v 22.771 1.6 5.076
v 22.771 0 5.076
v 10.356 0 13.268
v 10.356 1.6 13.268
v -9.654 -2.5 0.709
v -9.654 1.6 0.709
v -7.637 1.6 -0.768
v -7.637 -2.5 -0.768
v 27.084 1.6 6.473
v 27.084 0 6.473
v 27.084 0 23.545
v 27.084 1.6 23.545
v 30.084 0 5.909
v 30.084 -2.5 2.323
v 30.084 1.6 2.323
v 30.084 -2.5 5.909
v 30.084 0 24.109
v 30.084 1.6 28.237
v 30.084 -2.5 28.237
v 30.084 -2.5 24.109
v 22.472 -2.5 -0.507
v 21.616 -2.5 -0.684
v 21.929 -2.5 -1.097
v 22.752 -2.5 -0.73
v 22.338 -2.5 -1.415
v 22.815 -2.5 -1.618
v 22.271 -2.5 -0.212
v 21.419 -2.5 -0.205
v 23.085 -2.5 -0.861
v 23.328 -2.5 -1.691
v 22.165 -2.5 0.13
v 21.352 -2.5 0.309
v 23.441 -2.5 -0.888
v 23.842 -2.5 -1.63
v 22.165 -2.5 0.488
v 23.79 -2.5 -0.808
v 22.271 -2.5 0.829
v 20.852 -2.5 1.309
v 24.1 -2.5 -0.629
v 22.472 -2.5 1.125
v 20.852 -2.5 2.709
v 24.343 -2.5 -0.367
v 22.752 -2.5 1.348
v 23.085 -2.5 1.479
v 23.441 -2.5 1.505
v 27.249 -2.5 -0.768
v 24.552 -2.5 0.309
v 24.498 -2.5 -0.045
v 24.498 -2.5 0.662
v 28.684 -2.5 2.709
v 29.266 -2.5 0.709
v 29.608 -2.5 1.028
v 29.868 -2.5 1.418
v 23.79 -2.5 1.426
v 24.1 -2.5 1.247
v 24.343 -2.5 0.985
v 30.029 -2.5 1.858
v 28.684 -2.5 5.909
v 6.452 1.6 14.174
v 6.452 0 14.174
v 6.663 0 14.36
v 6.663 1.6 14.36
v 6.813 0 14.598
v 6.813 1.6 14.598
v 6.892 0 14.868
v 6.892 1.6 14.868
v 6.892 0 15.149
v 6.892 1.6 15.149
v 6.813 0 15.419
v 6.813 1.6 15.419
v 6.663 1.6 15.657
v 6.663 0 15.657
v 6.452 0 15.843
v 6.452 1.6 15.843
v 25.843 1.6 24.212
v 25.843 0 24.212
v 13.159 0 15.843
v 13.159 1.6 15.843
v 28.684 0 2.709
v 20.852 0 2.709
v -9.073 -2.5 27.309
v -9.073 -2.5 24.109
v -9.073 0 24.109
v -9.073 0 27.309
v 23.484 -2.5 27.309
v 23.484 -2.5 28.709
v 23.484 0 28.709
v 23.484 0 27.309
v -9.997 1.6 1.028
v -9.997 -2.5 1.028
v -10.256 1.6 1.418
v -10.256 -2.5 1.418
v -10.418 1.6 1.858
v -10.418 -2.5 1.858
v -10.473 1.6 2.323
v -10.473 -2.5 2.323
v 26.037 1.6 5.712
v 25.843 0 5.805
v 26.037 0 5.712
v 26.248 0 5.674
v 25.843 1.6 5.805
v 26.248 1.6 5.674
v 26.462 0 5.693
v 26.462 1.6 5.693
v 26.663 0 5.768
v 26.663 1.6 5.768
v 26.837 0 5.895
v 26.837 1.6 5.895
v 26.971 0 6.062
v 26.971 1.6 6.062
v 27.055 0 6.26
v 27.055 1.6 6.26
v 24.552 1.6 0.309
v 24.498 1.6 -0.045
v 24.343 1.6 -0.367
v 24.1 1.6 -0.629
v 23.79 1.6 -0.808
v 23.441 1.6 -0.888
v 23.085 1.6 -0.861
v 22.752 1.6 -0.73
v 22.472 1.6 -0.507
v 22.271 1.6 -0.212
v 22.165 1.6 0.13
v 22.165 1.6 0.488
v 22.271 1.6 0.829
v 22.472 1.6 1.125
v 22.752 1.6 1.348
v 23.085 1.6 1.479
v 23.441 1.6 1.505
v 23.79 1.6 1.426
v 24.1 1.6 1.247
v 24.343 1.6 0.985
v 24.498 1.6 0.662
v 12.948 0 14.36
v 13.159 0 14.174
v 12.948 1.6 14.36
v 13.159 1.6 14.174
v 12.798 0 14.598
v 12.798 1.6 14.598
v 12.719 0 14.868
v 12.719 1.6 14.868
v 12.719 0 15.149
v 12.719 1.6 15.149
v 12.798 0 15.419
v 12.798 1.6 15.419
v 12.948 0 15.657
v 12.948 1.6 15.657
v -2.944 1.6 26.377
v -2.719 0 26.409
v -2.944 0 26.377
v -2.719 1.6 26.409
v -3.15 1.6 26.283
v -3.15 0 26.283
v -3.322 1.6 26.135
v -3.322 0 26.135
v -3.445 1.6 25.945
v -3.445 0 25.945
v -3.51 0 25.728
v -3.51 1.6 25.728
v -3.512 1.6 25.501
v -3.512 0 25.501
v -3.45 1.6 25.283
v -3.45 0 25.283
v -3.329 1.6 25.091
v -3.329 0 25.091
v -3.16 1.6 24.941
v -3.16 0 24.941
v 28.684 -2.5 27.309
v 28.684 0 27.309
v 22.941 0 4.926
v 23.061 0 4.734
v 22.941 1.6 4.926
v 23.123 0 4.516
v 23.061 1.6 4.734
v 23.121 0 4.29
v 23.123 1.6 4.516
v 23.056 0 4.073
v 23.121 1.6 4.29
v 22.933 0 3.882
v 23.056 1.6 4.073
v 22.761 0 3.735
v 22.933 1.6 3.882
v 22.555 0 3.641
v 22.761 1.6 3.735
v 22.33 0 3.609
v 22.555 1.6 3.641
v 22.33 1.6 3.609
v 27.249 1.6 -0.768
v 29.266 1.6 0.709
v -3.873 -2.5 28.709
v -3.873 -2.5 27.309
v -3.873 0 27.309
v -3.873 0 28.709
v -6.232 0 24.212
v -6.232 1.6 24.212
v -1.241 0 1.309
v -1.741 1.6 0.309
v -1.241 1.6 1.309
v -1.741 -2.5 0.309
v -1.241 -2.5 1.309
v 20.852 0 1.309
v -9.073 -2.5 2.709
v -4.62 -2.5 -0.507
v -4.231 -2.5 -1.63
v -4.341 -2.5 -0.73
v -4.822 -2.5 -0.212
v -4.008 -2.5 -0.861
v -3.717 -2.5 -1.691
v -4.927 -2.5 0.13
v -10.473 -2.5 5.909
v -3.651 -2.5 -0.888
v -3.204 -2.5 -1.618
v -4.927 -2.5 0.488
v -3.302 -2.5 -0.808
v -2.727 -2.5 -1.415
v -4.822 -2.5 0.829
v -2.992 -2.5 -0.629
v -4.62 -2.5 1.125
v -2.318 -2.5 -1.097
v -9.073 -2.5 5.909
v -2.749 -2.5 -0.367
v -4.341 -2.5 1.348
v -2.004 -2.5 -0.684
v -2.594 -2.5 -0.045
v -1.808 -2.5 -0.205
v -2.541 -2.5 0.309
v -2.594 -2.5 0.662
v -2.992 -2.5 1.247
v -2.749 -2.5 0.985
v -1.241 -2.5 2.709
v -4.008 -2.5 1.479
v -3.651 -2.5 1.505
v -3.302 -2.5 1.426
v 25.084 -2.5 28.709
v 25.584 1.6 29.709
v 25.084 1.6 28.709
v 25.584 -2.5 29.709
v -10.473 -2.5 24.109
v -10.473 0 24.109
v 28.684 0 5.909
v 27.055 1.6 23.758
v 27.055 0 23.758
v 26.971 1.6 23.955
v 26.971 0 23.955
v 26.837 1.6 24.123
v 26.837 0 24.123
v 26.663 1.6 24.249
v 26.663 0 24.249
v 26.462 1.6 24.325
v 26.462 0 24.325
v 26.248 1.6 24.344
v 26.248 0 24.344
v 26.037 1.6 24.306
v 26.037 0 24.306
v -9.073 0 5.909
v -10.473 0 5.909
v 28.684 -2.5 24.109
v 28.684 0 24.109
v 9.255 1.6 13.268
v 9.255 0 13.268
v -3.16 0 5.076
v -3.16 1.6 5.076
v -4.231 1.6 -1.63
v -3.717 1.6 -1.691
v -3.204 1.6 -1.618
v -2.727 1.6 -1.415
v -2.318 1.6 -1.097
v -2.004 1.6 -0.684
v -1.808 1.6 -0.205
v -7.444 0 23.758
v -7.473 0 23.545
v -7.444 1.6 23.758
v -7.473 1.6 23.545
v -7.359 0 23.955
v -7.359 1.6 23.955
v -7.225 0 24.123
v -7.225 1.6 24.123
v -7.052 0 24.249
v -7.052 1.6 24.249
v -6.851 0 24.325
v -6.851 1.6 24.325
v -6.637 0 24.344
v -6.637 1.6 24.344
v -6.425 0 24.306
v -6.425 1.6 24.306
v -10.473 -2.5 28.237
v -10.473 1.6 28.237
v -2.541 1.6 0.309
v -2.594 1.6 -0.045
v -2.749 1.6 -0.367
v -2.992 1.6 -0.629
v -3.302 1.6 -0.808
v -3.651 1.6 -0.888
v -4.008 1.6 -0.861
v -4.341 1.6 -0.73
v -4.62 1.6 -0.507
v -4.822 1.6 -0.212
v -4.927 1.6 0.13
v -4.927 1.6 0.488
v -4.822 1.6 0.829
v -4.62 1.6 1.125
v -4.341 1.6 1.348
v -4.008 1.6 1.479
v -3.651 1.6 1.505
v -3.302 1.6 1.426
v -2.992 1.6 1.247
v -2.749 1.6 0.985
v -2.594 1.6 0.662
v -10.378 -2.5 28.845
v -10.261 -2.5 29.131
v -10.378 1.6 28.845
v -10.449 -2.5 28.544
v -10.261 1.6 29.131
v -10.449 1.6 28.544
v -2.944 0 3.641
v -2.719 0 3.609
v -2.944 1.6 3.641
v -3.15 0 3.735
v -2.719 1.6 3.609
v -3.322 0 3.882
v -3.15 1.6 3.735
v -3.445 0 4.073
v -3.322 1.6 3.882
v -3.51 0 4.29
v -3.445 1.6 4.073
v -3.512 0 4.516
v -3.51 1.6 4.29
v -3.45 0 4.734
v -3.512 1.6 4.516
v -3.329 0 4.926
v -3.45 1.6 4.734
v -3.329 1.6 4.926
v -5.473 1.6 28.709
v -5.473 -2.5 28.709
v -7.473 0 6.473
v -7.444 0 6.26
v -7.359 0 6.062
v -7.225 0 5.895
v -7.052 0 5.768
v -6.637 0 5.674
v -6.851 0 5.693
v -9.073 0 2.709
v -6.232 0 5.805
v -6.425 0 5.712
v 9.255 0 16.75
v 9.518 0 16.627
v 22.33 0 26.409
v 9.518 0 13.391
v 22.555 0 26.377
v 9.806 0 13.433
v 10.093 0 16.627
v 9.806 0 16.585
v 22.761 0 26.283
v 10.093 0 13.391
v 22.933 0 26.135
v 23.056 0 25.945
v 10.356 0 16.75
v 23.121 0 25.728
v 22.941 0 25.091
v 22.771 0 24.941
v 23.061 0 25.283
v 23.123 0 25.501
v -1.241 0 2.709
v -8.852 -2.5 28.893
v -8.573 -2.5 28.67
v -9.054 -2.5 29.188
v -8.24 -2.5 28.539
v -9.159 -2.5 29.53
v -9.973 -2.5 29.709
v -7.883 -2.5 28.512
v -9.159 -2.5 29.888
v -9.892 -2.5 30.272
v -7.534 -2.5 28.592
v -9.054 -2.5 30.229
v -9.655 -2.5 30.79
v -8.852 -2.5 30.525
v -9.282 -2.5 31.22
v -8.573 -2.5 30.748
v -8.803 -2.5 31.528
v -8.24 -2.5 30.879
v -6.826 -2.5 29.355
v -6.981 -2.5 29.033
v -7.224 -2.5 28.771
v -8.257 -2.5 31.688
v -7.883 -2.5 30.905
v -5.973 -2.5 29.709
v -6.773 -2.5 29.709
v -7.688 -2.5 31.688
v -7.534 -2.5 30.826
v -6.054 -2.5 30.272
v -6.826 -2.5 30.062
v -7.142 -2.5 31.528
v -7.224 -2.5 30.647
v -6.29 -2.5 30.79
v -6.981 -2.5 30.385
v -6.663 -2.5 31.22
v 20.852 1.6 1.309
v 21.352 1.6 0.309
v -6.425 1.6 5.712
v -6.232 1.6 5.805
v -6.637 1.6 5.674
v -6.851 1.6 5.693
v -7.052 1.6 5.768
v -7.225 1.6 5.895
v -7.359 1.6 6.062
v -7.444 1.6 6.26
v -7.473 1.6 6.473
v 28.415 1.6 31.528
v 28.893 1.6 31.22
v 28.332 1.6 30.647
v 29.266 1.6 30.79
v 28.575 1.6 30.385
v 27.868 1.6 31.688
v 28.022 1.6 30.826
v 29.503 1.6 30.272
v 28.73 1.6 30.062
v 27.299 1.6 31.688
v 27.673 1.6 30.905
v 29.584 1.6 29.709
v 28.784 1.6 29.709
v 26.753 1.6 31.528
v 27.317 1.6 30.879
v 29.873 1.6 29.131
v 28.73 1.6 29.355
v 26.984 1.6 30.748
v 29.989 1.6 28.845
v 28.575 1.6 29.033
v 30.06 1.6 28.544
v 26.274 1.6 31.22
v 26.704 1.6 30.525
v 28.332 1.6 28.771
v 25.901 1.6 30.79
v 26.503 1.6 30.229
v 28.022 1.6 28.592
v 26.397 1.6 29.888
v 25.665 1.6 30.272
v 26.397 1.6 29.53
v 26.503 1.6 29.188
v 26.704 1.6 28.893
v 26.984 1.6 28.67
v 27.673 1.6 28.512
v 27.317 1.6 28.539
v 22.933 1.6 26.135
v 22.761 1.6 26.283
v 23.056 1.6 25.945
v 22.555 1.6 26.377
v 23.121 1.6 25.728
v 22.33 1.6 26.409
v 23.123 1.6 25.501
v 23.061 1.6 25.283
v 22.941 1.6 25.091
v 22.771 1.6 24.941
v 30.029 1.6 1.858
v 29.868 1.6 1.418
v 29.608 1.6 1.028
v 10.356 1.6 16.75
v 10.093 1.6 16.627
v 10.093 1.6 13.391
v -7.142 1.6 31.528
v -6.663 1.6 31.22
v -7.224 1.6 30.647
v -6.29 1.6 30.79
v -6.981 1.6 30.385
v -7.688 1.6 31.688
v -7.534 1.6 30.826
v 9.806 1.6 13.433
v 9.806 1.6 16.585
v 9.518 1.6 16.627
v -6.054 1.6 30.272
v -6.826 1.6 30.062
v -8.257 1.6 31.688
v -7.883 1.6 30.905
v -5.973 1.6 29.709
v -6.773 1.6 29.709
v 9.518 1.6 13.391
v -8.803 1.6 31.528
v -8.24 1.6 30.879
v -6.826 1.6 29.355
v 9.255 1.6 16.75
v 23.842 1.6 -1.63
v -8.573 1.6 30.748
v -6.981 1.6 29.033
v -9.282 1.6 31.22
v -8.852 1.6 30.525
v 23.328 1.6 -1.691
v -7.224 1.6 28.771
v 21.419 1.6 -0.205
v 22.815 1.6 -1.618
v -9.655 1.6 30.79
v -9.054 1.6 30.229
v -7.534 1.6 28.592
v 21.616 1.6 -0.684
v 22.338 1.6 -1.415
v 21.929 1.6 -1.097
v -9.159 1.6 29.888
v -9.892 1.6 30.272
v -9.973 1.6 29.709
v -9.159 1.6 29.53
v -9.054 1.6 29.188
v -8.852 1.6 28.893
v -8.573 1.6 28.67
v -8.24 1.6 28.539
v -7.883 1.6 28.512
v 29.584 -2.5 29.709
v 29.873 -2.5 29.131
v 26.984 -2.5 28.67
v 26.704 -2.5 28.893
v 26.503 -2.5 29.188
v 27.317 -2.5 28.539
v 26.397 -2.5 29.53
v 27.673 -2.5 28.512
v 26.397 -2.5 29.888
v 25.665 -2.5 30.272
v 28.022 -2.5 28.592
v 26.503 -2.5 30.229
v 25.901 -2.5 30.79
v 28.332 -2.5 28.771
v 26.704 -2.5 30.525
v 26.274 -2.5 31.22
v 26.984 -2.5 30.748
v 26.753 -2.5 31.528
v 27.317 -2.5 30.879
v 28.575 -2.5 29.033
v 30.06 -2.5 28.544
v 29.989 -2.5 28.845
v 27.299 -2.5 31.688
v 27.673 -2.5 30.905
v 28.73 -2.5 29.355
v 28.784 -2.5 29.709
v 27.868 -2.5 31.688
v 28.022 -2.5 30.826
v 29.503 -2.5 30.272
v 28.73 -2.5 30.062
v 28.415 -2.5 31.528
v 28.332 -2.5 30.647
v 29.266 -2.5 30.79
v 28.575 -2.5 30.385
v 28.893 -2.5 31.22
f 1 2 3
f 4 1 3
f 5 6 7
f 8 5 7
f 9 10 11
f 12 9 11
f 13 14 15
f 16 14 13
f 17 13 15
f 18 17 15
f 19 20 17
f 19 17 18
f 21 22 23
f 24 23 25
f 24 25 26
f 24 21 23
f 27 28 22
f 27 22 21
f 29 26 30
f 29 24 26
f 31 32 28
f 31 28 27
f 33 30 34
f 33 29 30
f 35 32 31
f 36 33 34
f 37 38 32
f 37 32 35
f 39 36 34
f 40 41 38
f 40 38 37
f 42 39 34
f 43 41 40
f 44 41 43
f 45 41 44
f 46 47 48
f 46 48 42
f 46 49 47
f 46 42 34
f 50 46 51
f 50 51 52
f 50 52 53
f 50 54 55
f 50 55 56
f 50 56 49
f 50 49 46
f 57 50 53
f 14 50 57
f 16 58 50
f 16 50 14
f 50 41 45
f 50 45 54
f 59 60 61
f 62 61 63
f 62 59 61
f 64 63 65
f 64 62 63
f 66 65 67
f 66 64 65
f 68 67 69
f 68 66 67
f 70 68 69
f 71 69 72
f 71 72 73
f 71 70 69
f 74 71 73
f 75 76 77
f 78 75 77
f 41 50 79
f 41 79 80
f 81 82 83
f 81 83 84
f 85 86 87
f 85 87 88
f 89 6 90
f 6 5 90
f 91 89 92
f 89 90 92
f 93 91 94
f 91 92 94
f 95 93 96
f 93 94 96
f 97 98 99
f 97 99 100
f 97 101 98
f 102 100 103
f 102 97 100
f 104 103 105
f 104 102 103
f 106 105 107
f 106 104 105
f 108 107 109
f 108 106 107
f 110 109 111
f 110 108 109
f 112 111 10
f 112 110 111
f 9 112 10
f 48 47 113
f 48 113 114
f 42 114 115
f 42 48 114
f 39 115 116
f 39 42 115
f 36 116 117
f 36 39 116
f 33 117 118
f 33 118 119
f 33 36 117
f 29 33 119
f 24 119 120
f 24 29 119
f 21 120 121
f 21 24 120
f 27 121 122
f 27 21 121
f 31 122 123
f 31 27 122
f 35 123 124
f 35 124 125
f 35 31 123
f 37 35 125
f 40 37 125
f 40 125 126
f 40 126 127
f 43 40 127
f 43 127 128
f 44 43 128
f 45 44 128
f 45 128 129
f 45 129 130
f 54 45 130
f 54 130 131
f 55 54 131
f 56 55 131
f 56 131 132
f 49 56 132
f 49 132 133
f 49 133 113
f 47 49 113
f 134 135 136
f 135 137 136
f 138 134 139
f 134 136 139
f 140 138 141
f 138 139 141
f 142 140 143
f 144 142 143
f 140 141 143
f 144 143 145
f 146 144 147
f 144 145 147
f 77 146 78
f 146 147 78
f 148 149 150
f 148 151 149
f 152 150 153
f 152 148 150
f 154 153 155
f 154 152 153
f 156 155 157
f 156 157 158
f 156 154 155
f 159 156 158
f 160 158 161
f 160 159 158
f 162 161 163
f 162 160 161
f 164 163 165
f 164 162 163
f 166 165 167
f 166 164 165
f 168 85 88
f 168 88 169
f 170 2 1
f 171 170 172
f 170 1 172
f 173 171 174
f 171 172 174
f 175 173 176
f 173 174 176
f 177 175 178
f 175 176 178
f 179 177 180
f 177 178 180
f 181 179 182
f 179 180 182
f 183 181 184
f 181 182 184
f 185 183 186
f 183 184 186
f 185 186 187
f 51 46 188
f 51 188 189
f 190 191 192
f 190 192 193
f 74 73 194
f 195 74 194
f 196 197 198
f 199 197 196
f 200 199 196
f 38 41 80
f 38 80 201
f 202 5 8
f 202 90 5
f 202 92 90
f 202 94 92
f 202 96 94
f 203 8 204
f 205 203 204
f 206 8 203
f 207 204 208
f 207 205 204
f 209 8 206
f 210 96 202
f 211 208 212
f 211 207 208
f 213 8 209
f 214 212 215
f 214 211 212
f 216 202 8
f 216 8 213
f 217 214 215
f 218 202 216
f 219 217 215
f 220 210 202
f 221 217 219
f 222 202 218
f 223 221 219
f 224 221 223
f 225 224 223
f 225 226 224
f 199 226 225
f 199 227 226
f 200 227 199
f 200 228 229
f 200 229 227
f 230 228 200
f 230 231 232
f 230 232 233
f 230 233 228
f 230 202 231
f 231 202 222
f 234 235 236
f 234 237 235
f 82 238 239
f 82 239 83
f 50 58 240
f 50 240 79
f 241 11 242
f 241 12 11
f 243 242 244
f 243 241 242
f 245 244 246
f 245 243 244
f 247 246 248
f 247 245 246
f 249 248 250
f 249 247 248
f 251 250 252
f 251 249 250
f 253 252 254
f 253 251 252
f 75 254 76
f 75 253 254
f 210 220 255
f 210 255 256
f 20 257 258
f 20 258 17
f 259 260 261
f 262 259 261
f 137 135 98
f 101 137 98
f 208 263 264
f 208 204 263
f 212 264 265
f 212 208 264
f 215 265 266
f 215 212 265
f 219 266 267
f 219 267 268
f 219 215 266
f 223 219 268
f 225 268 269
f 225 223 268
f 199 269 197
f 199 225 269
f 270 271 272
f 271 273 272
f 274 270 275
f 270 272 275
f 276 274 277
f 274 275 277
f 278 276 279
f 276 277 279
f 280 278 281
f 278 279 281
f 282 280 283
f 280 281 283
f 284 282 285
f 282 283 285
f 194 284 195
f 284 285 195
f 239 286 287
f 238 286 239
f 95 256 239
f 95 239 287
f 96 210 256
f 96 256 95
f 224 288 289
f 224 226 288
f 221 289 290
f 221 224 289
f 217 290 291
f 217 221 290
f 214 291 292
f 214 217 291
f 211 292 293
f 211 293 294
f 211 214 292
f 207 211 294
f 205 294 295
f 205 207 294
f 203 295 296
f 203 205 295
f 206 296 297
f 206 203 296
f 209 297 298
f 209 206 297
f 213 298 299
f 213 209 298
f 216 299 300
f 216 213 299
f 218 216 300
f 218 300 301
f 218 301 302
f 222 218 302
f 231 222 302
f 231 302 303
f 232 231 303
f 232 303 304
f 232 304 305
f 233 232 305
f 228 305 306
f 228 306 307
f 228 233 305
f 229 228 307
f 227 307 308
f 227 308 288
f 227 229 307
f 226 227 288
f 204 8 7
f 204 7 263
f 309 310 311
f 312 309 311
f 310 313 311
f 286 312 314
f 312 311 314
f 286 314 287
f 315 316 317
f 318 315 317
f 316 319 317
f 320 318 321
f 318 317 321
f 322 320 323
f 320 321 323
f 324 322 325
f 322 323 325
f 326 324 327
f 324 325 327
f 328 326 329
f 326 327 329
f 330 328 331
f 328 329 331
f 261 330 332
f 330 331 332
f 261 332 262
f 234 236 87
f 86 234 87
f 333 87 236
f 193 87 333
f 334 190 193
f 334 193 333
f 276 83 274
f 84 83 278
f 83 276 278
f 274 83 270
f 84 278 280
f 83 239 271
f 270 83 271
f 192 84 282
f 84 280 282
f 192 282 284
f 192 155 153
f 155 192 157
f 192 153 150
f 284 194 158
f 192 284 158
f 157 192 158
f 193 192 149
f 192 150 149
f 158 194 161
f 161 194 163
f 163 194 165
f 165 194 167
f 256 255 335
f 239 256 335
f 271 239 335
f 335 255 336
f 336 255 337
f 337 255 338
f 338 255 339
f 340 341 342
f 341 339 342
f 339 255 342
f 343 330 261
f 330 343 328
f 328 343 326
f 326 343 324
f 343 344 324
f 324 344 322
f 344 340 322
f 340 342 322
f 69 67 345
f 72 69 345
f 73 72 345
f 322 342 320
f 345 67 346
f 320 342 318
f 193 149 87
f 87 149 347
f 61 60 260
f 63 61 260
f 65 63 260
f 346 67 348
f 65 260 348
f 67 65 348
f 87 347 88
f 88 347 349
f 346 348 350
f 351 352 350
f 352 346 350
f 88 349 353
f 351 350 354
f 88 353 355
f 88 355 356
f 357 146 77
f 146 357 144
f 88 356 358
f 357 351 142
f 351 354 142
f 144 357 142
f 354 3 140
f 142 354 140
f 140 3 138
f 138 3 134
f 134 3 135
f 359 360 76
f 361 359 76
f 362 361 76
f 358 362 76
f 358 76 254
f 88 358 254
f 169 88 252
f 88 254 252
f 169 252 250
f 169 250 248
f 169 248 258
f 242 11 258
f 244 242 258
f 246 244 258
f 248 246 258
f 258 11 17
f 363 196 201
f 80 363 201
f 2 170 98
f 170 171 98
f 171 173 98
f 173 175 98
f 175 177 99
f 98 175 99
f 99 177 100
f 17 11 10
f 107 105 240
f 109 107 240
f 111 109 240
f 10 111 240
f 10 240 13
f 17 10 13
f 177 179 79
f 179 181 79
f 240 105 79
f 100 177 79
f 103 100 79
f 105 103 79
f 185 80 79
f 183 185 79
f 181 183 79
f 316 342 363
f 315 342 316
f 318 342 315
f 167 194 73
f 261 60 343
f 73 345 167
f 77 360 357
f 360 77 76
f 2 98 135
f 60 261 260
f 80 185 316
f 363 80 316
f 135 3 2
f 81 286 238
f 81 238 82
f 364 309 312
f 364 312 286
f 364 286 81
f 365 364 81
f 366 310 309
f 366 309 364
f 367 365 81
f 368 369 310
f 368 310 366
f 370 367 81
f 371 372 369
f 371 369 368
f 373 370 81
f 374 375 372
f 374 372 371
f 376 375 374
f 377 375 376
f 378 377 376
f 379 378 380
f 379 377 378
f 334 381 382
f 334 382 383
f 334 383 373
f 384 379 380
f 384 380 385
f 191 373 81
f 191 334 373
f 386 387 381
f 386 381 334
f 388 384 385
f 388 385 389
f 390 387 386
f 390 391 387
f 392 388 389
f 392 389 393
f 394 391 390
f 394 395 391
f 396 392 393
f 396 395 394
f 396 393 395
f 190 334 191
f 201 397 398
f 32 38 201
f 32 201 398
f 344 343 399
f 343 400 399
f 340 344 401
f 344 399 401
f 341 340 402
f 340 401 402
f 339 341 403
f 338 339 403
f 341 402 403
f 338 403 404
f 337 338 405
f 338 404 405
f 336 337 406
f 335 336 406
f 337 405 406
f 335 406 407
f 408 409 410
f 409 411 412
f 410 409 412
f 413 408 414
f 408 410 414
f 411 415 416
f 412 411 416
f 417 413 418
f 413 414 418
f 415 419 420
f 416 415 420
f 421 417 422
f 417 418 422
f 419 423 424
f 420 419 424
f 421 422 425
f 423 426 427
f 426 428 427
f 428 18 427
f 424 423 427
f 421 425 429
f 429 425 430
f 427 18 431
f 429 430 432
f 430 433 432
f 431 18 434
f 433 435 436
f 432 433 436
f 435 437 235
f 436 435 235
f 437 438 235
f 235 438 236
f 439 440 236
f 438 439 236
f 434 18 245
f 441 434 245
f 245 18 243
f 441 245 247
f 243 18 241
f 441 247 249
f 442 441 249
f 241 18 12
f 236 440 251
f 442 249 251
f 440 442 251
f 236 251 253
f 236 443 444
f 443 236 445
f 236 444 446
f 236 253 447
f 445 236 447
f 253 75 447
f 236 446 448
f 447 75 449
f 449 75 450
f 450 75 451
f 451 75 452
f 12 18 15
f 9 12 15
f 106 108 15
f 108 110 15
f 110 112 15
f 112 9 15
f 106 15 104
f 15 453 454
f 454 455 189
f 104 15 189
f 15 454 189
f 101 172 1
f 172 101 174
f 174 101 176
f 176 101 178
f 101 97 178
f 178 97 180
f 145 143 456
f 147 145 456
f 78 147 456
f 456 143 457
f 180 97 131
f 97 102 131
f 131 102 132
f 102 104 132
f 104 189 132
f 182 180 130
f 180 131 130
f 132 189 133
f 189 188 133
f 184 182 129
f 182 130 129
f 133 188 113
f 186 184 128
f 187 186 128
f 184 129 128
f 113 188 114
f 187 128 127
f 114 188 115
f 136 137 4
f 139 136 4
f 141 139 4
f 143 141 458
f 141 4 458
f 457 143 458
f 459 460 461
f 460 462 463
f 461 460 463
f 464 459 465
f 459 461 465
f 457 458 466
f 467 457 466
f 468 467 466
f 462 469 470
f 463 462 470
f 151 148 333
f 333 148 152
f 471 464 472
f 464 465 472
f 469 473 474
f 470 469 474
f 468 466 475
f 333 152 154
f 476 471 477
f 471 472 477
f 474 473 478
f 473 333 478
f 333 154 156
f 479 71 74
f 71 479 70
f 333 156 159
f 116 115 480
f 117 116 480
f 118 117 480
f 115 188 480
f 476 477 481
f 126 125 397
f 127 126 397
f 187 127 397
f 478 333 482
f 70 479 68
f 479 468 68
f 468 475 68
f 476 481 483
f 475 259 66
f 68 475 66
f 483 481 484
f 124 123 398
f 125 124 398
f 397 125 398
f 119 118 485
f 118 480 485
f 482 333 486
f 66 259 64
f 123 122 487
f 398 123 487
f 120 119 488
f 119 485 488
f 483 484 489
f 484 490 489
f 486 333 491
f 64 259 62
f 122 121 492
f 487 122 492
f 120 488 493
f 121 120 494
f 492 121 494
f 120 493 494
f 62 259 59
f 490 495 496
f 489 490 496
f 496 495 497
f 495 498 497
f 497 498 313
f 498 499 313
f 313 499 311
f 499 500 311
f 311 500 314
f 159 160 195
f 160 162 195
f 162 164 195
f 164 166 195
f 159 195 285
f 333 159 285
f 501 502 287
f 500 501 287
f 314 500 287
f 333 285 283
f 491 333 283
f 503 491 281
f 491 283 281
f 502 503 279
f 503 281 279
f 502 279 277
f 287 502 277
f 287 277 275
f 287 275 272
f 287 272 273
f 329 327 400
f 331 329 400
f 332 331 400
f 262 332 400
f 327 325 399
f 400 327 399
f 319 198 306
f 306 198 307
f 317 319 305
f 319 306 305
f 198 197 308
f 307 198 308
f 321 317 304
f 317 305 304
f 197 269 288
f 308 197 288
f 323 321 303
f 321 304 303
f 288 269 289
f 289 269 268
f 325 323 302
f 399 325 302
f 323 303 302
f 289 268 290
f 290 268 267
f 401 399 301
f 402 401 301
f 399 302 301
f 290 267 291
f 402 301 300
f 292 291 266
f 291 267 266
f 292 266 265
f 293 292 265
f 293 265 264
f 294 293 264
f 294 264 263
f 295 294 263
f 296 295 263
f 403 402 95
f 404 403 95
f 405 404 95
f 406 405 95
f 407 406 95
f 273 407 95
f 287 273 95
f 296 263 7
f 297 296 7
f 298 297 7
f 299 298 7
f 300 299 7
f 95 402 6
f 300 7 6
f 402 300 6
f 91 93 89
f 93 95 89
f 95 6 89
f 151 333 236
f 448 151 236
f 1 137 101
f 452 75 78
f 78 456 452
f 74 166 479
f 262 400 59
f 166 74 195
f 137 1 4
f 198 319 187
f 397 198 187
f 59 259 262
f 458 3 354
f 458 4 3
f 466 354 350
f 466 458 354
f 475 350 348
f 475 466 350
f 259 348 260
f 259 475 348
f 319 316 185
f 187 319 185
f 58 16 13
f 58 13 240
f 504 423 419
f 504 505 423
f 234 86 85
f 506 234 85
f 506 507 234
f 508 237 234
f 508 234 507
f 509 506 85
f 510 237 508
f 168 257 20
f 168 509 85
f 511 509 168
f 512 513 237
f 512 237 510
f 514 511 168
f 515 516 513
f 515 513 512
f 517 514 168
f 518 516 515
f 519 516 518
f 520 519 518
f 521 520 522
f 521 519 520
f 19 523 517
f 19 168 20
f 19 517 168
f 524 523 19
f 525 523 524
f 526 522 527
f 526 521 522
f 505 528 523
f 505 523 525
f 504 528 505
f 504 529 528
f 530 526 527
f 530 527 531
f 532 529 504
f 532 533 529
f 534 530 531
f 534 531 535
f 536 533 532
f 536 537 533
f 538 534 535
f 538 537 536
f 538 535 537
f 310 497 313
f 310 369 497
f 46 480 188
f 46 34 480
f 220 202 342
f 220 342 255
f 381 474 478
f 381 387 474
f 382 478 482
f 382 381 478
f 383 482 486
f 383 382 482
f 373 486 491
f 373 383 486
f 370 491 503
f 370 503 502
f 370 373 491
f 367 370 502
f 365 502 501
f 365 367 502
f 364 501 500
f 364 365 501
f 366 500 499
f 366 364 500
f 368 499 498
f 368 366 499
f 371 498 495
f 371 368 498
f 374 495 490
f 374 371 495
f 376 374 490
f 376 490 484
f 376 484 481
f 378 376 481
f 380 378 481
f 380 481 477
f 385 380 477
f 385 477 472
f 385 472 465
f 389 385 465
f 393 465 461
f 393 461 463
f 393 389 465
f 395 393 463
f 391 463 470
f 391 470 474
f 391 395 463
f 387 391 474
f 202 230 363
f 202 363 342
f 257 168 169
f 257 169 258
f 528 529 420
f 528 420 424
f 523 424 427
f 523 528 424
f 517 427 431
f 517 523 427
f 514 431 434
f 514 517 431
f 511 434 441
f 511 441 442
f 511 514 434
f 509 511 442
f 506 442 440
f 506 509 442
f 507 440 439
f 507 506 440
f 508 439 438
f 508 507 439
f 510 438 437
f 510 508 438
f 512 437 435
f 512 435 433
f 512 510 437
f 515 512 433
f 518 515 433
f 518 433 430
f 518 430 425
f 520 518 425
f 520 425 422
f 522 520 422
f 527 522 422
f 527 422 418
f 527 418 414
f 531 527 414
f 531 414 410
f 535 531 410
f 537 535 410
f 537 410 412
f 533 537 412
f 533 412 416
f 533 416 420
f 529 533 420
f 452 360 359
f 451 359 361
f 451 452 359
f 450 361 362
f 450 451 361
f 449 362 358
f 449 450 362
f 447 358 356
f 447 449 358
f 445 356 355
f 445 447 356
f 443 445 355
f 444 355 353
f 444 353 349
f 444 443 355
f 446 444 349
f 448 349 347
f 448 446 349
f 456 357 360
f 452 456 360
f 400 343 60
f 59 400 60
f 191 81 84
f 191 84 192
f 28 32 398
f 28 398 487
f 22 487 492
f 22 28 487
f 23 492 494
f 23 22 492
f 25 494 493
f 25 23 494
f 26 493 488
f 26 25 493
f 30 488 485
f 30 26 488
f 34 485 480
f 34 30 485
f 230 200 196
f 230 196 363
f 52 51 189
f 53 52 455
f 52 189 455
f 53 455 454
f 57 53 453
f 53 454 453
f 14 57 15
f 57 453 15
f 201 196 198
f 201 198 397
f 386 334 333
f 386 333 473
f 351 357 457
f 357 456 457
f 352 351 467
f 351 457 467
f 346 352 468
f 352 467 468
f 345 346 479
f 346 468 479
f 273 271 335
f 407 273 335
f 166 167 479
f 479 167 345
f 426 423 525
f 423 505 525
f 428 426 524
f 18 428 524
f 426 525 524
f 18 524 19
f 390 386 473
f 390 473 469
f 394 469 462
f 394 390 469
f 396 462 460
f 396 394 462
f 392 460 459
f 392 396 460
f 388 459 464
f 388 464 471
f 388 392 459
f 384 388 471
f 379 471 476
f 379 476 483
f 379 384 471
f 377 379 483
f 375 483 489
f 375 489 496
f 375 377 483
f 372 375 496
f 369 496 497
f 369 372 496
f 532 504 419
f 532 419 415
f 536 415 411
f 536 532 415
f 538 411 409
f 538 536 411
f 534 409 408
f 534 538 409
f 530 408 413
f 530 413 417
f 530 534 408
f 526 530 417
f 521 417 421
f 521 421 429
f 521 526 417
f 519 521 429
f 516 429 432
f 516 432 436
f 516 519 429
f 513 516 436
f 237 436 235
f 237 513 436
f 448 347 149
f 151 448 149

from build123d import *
from build123d.topology import SkipClean

# Parameters (mm, degrees)
SKETCH1_R                = 1.38
SKETCH1_R_2              = 1
SKETCH1_W                = 37.356294072
SKETCH1_H                = 24.2
BOSS_EXTRUDE2_DEPTH      = 1.6
BOSS_EXTRUDE3_START      = 2.5
SKETCH3_R                = 1
BOSS_EXTRUDE3_DEPTH      = 2.5
SKETCH3_5_R              = 1.38
CUT_EXTRUDE1_DEPTH       = 3
MOVE_START               = -2.5
MOVE_FACE2_OUTLINE_R     = 1.2
MOVE_FACE2_OUTLINE_R_2   = 1
MOVE_FACE2_DEPTH         = 2.5
MOVE_FACE2_2_OUTLINE_R   = 1.2
MOVE_FACE2_2_OUTLINE_R_2 = 1
MOVE_FACE2_2_DEPTH       = 1.6
FILLET4_R                = 2
CUT_EXTRUDE2_DEPTH       = 10
FILLET6_R                = 1
FILLET7_R                = 0.8


# Read off the part's stored shape, not the designer's step: Move Face2
with BuildPart() as part:
    # Sketch1 → Boss-Extrude2 (new body)
    # profile 1 of 2: a face of its own
    with BuildSketch(Plane(origin=(0, 0, 0), x_dir=(1, 0, 0), z_dir=(0, 1, 0))):
        with BuildLine():
            ThreePointArc((29.583728431, -29.708730606), (27.583728431, -31.708730606), (25.583728431, -29.708730606))
            Line((25.583728431, -29.708730606), (25.083728431, -28.708730606))
            Line((25.083728431, -28.708730606), (9.805581395, -28.708730606))
            Line((9.805581395, -28.708730606), (-5.472565641, -28.708730606))
            Line((-5.472565641, -28.708730606), (-5.972565641, -29.708730606))
            ThreePointArc((-5.972565641, -29.708730606), (-7.972565641, -31.708730606), (-9.972565641, -29.708730606))
            Line((-9.972565641, -29.708730606), (-10.472565641, -28.708730606))
            Line((-10.472565641, -28.708730606), (-10.472565641, -6.308730606))
            Line((-10.472565641, -6.308730606), (-14.622565641, 1.591269394))
            ThreePointArc((-14.622565641, 1.591269394), (-16.743885984, 6.712589737), (-11.622565641, 4.591269394))
            Line((-11.622565641, 4.591269394), (-7.637430915, 0.768132014))
            Line((-7.637430915, 0.768132014), (-4.231183814, 1.630146375))
            ThreePointArc((-4.231183814, 1.630146375), (-2.511966494, 1.269454739), (-1.740514831, -0.308730606))
            Line((-1.740514831, -0.308730606), (-1.240514831, -1.308730606))
            Line((-1.240514831, -1.308730606), (20.851677621, -1.308730606))
            Line((20.851677621, -1.308730606), (21.351677621, -0.308730606))
            ThreePointArc((21.351677621, -0.308730606), (22.123129284, 1.269454739), (23.842346605, 1.630146375))
            Line((23.842346605, 1.630146375), (27.248593706, 0.768132014))
            Line((27.248593706, 0.768132014), (31.233728431, 4.591269394))
            ThreePointArc((31.233728431, 4.591269394), (36.355048775, 6.712589737), (34.233728431, 1.591269394))
            Line((34.233728431, 1.591269394), (30.083728431, -6.308730606))
            Line((30.083728431, -6.308730606), (30.083728431, -28.708730606))
            Line((30.083728431, -28.708730606), (29.583728431, -29.708730606))
        make_face()
        with Locations(Location((34.233728431, 4.591269394, 0), (0, 0, 270))):
            Circle(SKETCH1_R, mode=Mode.SUBTRACT)
        with Locations(Location((23.351677621, -0.308730606, 0), (0, 0, 270))):
            Circle(SKETCH1_R_2, mode=Mode.SUBTRACT)
        with Locations(Location((-3.740514831, -0.308730606, 0), (0, 0, 270))):
            Circle(SKETCH1_R_2, mode=Mode.SUBTRACT)
        with Locations(Location((-7.972565641, -29.708730606, 0), (0, 0, 270))):
            Circle(SKETCH1_R_2, mode=Mode.SUBTRACT)
        with Locations(Location((-14.622565641, 4.591269394, 0), (0, 0, 270))):
            Circle(SKETCH1_R, mode=Mode.SUBTRACT)
        with Locations(Location((27.583728431, -29.708730606, 0), (0, 0, 270))):
            Circle(SKETCH1_R_2, mode=Mode.SUBTRACT)
        with Locations((9.805581395, -15.008730606)):
            Rectangle(SKETCH1_W, SKETCH1_H, mode=Mode.SUBTRACT)
    # profile 2 of 2: a face of its own
    with BuildSketch(Plane(origin=(0, 0, 0), x_dir=(1, 0, 0), z_dir=(0, 1, 0))):
        with Locations((9.805581395, -15.008730606)):
            Rectangle(SKETCH1_W, SKETCH1_H)
    extrude(amount=BOSS_EXTRUDE2_DEPTH)

    # Sketch3 → Boss-Extrude3 (add)
    # profile 1 of 4: a face of its own
    with SkipClean():  # the faces are left unmerged after this step: merging them gives an invalid solid
        with BuildSketch(Plane.XZ.offset(BOSS_EXTRUDE3_START)):
            with BuildLine():
                Line((23.483728431, 27.108730606), (28.483728431, 27.108730606))
                Line((28.483728431, 27.108730606), (28.483728431, 24.108730606))
                Line((28.483728431, 24.108730606), (30.083728431, 24.108730606))
                Line((30.083728431, 24.108730606), (30.083728431, 28.708730606))
                Line((30.083728431, 28.708730606), (29.583728431, 29.708730606))
                ThreePointArc((29.583728431, 29.708730606), (27.583728431, 31.708730606), (25.583728431, 29.708730606))
                Line((25.583728431, 29.708730606), (25.083728431, 28.708730606))
                Line((25.083728431, 28.708730606), (23.483728431, 28.708730606))
                Line((23.483728431, 28.708730606), (23.483728431, 27.108730606))
            make_face()
            with Locations(Location((27.583728431, 29.708730606, 0), (0, 0, 270))):
                Circle(SKETCH3_R, mode=Mode.SUBTRACT)
        # profile 2 of 4: a face of its own
        with BuildSketch(Plane.XZ.offset(BOSS_EXTRUDE3_START)):
            with BuildLine():
                Line((-8.872565641, 27.108730606), (-3.872565641, 27.108730606))
                Line((-3.872565641, 27.108730606), (-3.872565641, 28.708730606))
                Line((-3.872565641, 28.708730606), (-5.472565641, 28.708730606))
                Line((-5.472565641, 28.708730606), (-5.972565641, 29.708730606))
                ThreePointArc((-5.972565641, 29.708730606), (-7.972565641, 31.708730606), (-9.972565641, 29.708730606))
                Line((-9.972565641, 29.708730606), (-10.472565641, 28.708730606))
                Line((-10.472565641, 28.708730606), (-10.472565641, 24.108730606))
                Line((-10.472565641, 24.108730606), (-8.872565641, 24.108730606))
                Line((-8.872565641, 24.108730606), (-8.872565641, 27.108730606))
            make_face()
            with Locations(Location((-7.972565641, 29.708730606, 0), (0, 0, 270))):
                Circle(SKETCH3_R, mode=Mode.SUBTRACT)
        # profile 3 of 4: a face of its own
        with BuildSketch(Plane.XZ.offset(BOSS_EXTRUDE3_START)):
            with BuildLine():
                Line((30.083728431, 5.908730606), (28.483728431, 5.908730606))
                Line((28.483728431, 5.908730606), (28.483728431, 2.908730606))
                Line((28.483728431, 2.908730606), (20.851677621, 2.908730606))
                Line((20.851677621, 2.908730606), (20.851677621, 1.308730606))
                Line((20.851677621, 1.308730606), (21.351677621, 0.308730606))
                ThreePointArc((21.351677621, 0.308730606), (22.123129284, -1.269454739), (23.842346605, -1.630146375))
                Line((23.842346605, -1.630146375), (27.248593706, -0.768132014))
                Line((27.248593706, -0.768132014), (30.083728431, 1.308730606))
                Line((30.083728431, 1.308730606), (30.083728431, 5.908730606))
            make_face()
            with Locations(Location((23.351677621, 0.308730606, 0), (0, 0, 270))):
                Circle(SKETCH3_R, mode=Mode.SUBTRACT)
        # profile 4 of 4: a face of its own
        with BuildSketch(Plane.XZ.offset(BOSS_EXTRUDE3_START)):
            with BuildLine():
                Line((-8.872565641, 2.908730606), (-8.872565641, 5.908730606))
                Line((-8.872565641, 5.908730606), (-10.472565641, 5.908730606))
                Line((-10.472565641, 5.908730606), (-10.472565641, 1.308730606))
                Line((-10.472565641, 1.308730606), (-7.637430915, -0.768132014))
                Line((-7.637430915, -0.768132014), (-4.231183814, -1.630146375))
                ThreePointArc((-4.231183814, -1.630146375), (-2.511966494, -1.269454739), (-1.740514831, 0.308730606))
                Line((-1.740514831, 0.308730606), (-1.240514831, 1.308730606))
                Line((-1.240514831, 1.308730606), (-1.240514831, 2.908730606))
                Line((-1.240514831, 2.908730606), (-8.872565641, 2.908730606))
            make_face()
            with Locations(Location((-3.740514831, 0.308730606, 0), (0, 0, 270))):
                Circle(SKETCH3_R, mode=Mode.SUBTRACT)
        extrude(amount=-BOSS_EXTRUDE3_DEPTH)

    # Sketch3<5> → Cut-Extrude1 (cut)
    # profile 1 of 2: a face of its own
    with SkipClean():  # the faces are left unmerged after this step: merging them gives an invalid solid
        with BuildSketch(Plane.XZ):
            with BuildLine():
                Line((27.248593706, -0.768132014), (30.083728431, 1.308730606))
                Line((30.083728431, 1.308730606), (30.083728431, 6.308730606))
                Line((30.083728431, 6.308730606), (34.233728431, -1.591269394))
                ThreePointArc((34.233728431, -1.591269394), (36.355048775, -6.712589737), (31.233728431, -4.591269394))
                Line((31.233728431, -4.591269394), (27.248593706, -0.768132014))
            make_face()
            with Locations((34.233728431, -4.591269394)):
                Circle(SKETCH3_5_R, mode=Mode.SUBTRACT)
        # profile 2 of 2: a face of its own
        with BuildSketch(Plane.XZ):
            with BuildLine():
                Line((-10.472565641, 1.308730606), (-7.637430915, -0.768132014))
                Line((-7.637430915, -0.768132014), (-11.622565641, -4.591269394))
                ThreePointArc((-11.622565641, -4.591269394), (-16.743885984, -6.712589737), (-14.622565641, -1.591269394))
                Line((-14.622565641, -1.591269394), (-10.472565641, 6.308730606))
                Line((-10.472565641, 6.308730606), (-10.472565641, 1.308730606))
            make_face()
            with Locations((-14.622565641, -4.591269394)):
                Circle(SKETCH3_5_R, mode=Mode.SUBTRACT)
        extrude(amount=-CUT_EXTRUDE1_DEPTH, mode=Mode.SUBTRACT)

    # Move Face2 outline → Move Face2 (cut)
    # profile 1 of 8: a face of its own
    with BuildSketch(Plane(origin=(0, 0, 0), x_dir=(1, 0, 0), z_dir=(0, 1, 0)).offset(MOVE_START)):
        with Locations((-7.972565641, -29.708730606)):
            Circle(MOVE_FACE2_OUTLINE_R)
        with Locations((-7.972565641, -29.708730606)):
            Circle(MOVE_FACE2_OUTLINE_R_2, mode=Mode.SUBTRACT)
    # profile 2 of 8: a face of its own
    with BuildSketch(Plane(origin=(0, 0, 0), x_dir=(1, 0, 0), z_dir=(0, 1, 0)).offset(MOVE_START)):
        with Locations((-3.740514831, -0.308730606)):
            Circle(MOVE_FACE2_OUTLINE_R)
        with Locations((-3.740514831, -0.308730606)):
            Circle(MOVE_FACE2_OUTLINE_R_2, mode=Mode.SUBTRACT)
    # profile 3 of 8: a face of its own
    with BuildSketch(Plane(origin=(0, 0, 0), x_dir=(1, 0, 0), z_dir=(0, 1, 0)).offset(MOVE_START)):
        with Locations((23.351677621, -0.308730606)):
            Circle(MOVE_FACE2_OUTLINE_R)
        with Locations((23.351677621, -0.308730606)):
            Circle(MOVE_FACE2_OUTLINE_R_2, mode=Mode.SUBTRACT)
    # profile 4 of 8: a face of its own
    with BuildSketch(Plane(origin=(0, 0, 0), x_dir=(1, 0, 0), z_dir=(0, 1, 0)).offset(MOVE_START)):
        with Locations((27.583728431, -29.708730606)):
            Circle(MOVE_FACE2_OUTLINE_R)
        with Locations((27.583728431, -29.708730606)):
            Circle(MOVE_FACE2_OUTLINE_R_2, mode=Mode.SUBTRACT)
    # profile 5 of 8: a face of its own
    with BuildSketch(Plane(origin=(0, 0, 0), x_dir=(1, 0, 0), z_dir=(0, 1, 0)).offset(MOVE_START)):
        Polygon((23.483728431, -27.308730606), (28.683728431, -27.308730606), (28.683728431, -24.108730606), (28.483728431, -24.108730606), (28.483728431, -27.108730606), (23.483728431, -27.108730606), align=None)
    # profile 6 of 8: a face of its own
    with BuildSketch(Plane(origin=(0, 0, 0), x_dir=(1, 0, 0), z_dir=(0, 1, 0)).offset(MOVE_START)):
        Polygon((-9.072565641, -27.308730606), (-3.872565641, -27.308730606), (-3.872565641, -27.108730606), (-8.872565641, -27.108730606), (-8.872565641, -24.108730606), (-9.072565641, -24.108730606), align=None)
    # profile 7 of 8: a face of its own
    with BuildSketch(Plane(origin=(0, 0, 0), x_dir=(1, 0, 0), z_dir=(0, 1, 0)).offset(MOVE_START)):
        Polygon((28.683728431, -5.908730606), (28.683728431, -2.708730606), (20.851677621, -2.708730606), (20.851677621, -2.908730606), (28.483728431, -2.908730606), (28.483728431, -5.908730606), align=None)
    # profile 8 of 8: a face of its own
    with BuildSketch(Plane(origin=(0, 0, 0), x_dir=(1, 0, 0), z_dir=(0, 1, 0)).offset(MOVE_START)):
        Polygon((-9.072565641, -2.708730606), (-9.072565641, -5.908730606), (-8.872565641, -5.908730606), (-8.872565641, -2.908730606), (-1.240514831, -2.908730606), (-1.240514831, -2.708730606), align=None)
    extrude(amount=MOVE_FACE2_DEPTH, mode=Mode.SUBTRACT)

    # Move Face2 2 outline → Move Face2 2 (cut)
    # profile 1 of 4: a face of its own
    with BuildSketch(Plane(origin=(0, 0, 0), x_dir=(1, 0, 0), z_dir=(0, 1, 0))):
        with Locations((-7.972565641, -29.708730606)):
            Circle(MOVE_FACE2_2_OUTLINE_R)
        with Locations((-7.972565641, -29.708730606)):
            Circle(MOVE_FACE2_2_OUTLINE_R_2, mode=Mode.SUBTRACT)
    # profile 2 of 4: a face of its own
    with BuildSketch(Plane(origin=(0, 0, 0), x_dir=(1, 0, 0), z_dir=(0, 1, 0))):
        with Locations((-3.740514831, -0.308730606)):
            Circle(MOVE_FACE2_2_OUTLINE_R)
        with Locations((-3.740514831, -0.308730606)):
            Circle(MOVE_FACE2_2_OUTLINE_R_2, mode=Mode.SUBTRACT)
    # profile 3 of 4: a face of its own
    with BuildSketch(Plane(origin=(0, 0, 0), x_dir=(1, 0, 0), z_dir=(0, 1, 0))):
        with Locations((23.351677621, -0.308730606)):
            Circle(MOVE_FACE2_2_OUTLINE_R)
        with Locations((23.351677621, -0.308730606)):
            Circle(MOVE_FACE2_2_OUTLINE_R_2, mode=Mode.SUBTRACT)
    # profile 4 of 4: a face of its own
    with BuildSketch(Plane(origin=(0, 0, 0), x_dir=(1, 0, 0), z_dir=(0, 1, 0))):
        with Locations((27.583728431, -29.708730606)):
            Circle(MOVE_FACE2_2_OUTLINE_R)
        with Locations((27.583728431, -29.708730606)):
            Circle(MOVE_FACE2_2_OUTLINE_R_2, mode=Mode.SUBTRACT)
    extrude(amount=MOVE_FACE2_2_DEPTH, mode=Mode.SUBTRACT)

    # Fillet4
    fillet4_edges = [part.edges().sort_by_distance(p)[0] for p in [
        (-10.472565641, -0.45, 1.308730606),
        (30.083728431, -0.45, 1.308730606),
        (-10.472565641, -0.45, 28.708730606),
        (30.083728431, -0.45, 28.708730606),
    ]]
    fillet(fillet4_edges, radius=FILLET4_R)

    # Sketch6 → Cut-Extrude2 (cut)
    with BuildSketch(Plane.XZ):
        Polygon((-7.472565641, 25.030971684), (-7.472565641, 4.986489529), (7.717412865, 15.008730606), align=None)
        Polygon((9.805581395, 16.386489529), (24.995559901, 26.408730606), (-5.38439711, 26.408730606), align=None)
        Polygon((11.893749926, 15.008730606), (27.083728431, 4.986489529), (27.083728431, 25.030971684), align=None)
        Polygon((-5.38439711, 3.608730606), (24.995559901, 3.608730606), (9.805581395, 13.630971684), align=None)
    extrude(amount=-CUT_EXTRUDE2_DEPTH, mode=Mode.SUBTRACT)

    # Fillet6
    fillet6_edges = [part.edges().sort_by_distance(p)[0] for p in [
        (11.893749926, 0.8, 15.008730606),
        (9.805581395, 0.8, 16.386489529),
        (9.805581395, 0.8, 13.630971684),
        (7.717412865, 0.8, 15.008730606),
    ]]
    fillet(fillet6_edges, radius=FILLET6_R)

    # Fillet7
    fillet7_edges = [part.edges().sort_by_distance(p)[0] for p in [
        (27.083728431, 0.8, 4.986489529),
        (27.083728431, 0.8, 25.030971684),
        (-5.38439711, 0.8, 26.408730606),
        (24.995559901, 0.8, 26.408730606),
        (24.995559901, 0.8, 3.608730606),
        (-5.38439711, 0.8, 3.608730606),
        (-7.472565641, 0.8, 4.986489529),
        (-7.472565641, 0.8, 25.030971684),
    ]]
    fillet(fillet7_edges, radius=FILLET7_R)


solid = part.part
